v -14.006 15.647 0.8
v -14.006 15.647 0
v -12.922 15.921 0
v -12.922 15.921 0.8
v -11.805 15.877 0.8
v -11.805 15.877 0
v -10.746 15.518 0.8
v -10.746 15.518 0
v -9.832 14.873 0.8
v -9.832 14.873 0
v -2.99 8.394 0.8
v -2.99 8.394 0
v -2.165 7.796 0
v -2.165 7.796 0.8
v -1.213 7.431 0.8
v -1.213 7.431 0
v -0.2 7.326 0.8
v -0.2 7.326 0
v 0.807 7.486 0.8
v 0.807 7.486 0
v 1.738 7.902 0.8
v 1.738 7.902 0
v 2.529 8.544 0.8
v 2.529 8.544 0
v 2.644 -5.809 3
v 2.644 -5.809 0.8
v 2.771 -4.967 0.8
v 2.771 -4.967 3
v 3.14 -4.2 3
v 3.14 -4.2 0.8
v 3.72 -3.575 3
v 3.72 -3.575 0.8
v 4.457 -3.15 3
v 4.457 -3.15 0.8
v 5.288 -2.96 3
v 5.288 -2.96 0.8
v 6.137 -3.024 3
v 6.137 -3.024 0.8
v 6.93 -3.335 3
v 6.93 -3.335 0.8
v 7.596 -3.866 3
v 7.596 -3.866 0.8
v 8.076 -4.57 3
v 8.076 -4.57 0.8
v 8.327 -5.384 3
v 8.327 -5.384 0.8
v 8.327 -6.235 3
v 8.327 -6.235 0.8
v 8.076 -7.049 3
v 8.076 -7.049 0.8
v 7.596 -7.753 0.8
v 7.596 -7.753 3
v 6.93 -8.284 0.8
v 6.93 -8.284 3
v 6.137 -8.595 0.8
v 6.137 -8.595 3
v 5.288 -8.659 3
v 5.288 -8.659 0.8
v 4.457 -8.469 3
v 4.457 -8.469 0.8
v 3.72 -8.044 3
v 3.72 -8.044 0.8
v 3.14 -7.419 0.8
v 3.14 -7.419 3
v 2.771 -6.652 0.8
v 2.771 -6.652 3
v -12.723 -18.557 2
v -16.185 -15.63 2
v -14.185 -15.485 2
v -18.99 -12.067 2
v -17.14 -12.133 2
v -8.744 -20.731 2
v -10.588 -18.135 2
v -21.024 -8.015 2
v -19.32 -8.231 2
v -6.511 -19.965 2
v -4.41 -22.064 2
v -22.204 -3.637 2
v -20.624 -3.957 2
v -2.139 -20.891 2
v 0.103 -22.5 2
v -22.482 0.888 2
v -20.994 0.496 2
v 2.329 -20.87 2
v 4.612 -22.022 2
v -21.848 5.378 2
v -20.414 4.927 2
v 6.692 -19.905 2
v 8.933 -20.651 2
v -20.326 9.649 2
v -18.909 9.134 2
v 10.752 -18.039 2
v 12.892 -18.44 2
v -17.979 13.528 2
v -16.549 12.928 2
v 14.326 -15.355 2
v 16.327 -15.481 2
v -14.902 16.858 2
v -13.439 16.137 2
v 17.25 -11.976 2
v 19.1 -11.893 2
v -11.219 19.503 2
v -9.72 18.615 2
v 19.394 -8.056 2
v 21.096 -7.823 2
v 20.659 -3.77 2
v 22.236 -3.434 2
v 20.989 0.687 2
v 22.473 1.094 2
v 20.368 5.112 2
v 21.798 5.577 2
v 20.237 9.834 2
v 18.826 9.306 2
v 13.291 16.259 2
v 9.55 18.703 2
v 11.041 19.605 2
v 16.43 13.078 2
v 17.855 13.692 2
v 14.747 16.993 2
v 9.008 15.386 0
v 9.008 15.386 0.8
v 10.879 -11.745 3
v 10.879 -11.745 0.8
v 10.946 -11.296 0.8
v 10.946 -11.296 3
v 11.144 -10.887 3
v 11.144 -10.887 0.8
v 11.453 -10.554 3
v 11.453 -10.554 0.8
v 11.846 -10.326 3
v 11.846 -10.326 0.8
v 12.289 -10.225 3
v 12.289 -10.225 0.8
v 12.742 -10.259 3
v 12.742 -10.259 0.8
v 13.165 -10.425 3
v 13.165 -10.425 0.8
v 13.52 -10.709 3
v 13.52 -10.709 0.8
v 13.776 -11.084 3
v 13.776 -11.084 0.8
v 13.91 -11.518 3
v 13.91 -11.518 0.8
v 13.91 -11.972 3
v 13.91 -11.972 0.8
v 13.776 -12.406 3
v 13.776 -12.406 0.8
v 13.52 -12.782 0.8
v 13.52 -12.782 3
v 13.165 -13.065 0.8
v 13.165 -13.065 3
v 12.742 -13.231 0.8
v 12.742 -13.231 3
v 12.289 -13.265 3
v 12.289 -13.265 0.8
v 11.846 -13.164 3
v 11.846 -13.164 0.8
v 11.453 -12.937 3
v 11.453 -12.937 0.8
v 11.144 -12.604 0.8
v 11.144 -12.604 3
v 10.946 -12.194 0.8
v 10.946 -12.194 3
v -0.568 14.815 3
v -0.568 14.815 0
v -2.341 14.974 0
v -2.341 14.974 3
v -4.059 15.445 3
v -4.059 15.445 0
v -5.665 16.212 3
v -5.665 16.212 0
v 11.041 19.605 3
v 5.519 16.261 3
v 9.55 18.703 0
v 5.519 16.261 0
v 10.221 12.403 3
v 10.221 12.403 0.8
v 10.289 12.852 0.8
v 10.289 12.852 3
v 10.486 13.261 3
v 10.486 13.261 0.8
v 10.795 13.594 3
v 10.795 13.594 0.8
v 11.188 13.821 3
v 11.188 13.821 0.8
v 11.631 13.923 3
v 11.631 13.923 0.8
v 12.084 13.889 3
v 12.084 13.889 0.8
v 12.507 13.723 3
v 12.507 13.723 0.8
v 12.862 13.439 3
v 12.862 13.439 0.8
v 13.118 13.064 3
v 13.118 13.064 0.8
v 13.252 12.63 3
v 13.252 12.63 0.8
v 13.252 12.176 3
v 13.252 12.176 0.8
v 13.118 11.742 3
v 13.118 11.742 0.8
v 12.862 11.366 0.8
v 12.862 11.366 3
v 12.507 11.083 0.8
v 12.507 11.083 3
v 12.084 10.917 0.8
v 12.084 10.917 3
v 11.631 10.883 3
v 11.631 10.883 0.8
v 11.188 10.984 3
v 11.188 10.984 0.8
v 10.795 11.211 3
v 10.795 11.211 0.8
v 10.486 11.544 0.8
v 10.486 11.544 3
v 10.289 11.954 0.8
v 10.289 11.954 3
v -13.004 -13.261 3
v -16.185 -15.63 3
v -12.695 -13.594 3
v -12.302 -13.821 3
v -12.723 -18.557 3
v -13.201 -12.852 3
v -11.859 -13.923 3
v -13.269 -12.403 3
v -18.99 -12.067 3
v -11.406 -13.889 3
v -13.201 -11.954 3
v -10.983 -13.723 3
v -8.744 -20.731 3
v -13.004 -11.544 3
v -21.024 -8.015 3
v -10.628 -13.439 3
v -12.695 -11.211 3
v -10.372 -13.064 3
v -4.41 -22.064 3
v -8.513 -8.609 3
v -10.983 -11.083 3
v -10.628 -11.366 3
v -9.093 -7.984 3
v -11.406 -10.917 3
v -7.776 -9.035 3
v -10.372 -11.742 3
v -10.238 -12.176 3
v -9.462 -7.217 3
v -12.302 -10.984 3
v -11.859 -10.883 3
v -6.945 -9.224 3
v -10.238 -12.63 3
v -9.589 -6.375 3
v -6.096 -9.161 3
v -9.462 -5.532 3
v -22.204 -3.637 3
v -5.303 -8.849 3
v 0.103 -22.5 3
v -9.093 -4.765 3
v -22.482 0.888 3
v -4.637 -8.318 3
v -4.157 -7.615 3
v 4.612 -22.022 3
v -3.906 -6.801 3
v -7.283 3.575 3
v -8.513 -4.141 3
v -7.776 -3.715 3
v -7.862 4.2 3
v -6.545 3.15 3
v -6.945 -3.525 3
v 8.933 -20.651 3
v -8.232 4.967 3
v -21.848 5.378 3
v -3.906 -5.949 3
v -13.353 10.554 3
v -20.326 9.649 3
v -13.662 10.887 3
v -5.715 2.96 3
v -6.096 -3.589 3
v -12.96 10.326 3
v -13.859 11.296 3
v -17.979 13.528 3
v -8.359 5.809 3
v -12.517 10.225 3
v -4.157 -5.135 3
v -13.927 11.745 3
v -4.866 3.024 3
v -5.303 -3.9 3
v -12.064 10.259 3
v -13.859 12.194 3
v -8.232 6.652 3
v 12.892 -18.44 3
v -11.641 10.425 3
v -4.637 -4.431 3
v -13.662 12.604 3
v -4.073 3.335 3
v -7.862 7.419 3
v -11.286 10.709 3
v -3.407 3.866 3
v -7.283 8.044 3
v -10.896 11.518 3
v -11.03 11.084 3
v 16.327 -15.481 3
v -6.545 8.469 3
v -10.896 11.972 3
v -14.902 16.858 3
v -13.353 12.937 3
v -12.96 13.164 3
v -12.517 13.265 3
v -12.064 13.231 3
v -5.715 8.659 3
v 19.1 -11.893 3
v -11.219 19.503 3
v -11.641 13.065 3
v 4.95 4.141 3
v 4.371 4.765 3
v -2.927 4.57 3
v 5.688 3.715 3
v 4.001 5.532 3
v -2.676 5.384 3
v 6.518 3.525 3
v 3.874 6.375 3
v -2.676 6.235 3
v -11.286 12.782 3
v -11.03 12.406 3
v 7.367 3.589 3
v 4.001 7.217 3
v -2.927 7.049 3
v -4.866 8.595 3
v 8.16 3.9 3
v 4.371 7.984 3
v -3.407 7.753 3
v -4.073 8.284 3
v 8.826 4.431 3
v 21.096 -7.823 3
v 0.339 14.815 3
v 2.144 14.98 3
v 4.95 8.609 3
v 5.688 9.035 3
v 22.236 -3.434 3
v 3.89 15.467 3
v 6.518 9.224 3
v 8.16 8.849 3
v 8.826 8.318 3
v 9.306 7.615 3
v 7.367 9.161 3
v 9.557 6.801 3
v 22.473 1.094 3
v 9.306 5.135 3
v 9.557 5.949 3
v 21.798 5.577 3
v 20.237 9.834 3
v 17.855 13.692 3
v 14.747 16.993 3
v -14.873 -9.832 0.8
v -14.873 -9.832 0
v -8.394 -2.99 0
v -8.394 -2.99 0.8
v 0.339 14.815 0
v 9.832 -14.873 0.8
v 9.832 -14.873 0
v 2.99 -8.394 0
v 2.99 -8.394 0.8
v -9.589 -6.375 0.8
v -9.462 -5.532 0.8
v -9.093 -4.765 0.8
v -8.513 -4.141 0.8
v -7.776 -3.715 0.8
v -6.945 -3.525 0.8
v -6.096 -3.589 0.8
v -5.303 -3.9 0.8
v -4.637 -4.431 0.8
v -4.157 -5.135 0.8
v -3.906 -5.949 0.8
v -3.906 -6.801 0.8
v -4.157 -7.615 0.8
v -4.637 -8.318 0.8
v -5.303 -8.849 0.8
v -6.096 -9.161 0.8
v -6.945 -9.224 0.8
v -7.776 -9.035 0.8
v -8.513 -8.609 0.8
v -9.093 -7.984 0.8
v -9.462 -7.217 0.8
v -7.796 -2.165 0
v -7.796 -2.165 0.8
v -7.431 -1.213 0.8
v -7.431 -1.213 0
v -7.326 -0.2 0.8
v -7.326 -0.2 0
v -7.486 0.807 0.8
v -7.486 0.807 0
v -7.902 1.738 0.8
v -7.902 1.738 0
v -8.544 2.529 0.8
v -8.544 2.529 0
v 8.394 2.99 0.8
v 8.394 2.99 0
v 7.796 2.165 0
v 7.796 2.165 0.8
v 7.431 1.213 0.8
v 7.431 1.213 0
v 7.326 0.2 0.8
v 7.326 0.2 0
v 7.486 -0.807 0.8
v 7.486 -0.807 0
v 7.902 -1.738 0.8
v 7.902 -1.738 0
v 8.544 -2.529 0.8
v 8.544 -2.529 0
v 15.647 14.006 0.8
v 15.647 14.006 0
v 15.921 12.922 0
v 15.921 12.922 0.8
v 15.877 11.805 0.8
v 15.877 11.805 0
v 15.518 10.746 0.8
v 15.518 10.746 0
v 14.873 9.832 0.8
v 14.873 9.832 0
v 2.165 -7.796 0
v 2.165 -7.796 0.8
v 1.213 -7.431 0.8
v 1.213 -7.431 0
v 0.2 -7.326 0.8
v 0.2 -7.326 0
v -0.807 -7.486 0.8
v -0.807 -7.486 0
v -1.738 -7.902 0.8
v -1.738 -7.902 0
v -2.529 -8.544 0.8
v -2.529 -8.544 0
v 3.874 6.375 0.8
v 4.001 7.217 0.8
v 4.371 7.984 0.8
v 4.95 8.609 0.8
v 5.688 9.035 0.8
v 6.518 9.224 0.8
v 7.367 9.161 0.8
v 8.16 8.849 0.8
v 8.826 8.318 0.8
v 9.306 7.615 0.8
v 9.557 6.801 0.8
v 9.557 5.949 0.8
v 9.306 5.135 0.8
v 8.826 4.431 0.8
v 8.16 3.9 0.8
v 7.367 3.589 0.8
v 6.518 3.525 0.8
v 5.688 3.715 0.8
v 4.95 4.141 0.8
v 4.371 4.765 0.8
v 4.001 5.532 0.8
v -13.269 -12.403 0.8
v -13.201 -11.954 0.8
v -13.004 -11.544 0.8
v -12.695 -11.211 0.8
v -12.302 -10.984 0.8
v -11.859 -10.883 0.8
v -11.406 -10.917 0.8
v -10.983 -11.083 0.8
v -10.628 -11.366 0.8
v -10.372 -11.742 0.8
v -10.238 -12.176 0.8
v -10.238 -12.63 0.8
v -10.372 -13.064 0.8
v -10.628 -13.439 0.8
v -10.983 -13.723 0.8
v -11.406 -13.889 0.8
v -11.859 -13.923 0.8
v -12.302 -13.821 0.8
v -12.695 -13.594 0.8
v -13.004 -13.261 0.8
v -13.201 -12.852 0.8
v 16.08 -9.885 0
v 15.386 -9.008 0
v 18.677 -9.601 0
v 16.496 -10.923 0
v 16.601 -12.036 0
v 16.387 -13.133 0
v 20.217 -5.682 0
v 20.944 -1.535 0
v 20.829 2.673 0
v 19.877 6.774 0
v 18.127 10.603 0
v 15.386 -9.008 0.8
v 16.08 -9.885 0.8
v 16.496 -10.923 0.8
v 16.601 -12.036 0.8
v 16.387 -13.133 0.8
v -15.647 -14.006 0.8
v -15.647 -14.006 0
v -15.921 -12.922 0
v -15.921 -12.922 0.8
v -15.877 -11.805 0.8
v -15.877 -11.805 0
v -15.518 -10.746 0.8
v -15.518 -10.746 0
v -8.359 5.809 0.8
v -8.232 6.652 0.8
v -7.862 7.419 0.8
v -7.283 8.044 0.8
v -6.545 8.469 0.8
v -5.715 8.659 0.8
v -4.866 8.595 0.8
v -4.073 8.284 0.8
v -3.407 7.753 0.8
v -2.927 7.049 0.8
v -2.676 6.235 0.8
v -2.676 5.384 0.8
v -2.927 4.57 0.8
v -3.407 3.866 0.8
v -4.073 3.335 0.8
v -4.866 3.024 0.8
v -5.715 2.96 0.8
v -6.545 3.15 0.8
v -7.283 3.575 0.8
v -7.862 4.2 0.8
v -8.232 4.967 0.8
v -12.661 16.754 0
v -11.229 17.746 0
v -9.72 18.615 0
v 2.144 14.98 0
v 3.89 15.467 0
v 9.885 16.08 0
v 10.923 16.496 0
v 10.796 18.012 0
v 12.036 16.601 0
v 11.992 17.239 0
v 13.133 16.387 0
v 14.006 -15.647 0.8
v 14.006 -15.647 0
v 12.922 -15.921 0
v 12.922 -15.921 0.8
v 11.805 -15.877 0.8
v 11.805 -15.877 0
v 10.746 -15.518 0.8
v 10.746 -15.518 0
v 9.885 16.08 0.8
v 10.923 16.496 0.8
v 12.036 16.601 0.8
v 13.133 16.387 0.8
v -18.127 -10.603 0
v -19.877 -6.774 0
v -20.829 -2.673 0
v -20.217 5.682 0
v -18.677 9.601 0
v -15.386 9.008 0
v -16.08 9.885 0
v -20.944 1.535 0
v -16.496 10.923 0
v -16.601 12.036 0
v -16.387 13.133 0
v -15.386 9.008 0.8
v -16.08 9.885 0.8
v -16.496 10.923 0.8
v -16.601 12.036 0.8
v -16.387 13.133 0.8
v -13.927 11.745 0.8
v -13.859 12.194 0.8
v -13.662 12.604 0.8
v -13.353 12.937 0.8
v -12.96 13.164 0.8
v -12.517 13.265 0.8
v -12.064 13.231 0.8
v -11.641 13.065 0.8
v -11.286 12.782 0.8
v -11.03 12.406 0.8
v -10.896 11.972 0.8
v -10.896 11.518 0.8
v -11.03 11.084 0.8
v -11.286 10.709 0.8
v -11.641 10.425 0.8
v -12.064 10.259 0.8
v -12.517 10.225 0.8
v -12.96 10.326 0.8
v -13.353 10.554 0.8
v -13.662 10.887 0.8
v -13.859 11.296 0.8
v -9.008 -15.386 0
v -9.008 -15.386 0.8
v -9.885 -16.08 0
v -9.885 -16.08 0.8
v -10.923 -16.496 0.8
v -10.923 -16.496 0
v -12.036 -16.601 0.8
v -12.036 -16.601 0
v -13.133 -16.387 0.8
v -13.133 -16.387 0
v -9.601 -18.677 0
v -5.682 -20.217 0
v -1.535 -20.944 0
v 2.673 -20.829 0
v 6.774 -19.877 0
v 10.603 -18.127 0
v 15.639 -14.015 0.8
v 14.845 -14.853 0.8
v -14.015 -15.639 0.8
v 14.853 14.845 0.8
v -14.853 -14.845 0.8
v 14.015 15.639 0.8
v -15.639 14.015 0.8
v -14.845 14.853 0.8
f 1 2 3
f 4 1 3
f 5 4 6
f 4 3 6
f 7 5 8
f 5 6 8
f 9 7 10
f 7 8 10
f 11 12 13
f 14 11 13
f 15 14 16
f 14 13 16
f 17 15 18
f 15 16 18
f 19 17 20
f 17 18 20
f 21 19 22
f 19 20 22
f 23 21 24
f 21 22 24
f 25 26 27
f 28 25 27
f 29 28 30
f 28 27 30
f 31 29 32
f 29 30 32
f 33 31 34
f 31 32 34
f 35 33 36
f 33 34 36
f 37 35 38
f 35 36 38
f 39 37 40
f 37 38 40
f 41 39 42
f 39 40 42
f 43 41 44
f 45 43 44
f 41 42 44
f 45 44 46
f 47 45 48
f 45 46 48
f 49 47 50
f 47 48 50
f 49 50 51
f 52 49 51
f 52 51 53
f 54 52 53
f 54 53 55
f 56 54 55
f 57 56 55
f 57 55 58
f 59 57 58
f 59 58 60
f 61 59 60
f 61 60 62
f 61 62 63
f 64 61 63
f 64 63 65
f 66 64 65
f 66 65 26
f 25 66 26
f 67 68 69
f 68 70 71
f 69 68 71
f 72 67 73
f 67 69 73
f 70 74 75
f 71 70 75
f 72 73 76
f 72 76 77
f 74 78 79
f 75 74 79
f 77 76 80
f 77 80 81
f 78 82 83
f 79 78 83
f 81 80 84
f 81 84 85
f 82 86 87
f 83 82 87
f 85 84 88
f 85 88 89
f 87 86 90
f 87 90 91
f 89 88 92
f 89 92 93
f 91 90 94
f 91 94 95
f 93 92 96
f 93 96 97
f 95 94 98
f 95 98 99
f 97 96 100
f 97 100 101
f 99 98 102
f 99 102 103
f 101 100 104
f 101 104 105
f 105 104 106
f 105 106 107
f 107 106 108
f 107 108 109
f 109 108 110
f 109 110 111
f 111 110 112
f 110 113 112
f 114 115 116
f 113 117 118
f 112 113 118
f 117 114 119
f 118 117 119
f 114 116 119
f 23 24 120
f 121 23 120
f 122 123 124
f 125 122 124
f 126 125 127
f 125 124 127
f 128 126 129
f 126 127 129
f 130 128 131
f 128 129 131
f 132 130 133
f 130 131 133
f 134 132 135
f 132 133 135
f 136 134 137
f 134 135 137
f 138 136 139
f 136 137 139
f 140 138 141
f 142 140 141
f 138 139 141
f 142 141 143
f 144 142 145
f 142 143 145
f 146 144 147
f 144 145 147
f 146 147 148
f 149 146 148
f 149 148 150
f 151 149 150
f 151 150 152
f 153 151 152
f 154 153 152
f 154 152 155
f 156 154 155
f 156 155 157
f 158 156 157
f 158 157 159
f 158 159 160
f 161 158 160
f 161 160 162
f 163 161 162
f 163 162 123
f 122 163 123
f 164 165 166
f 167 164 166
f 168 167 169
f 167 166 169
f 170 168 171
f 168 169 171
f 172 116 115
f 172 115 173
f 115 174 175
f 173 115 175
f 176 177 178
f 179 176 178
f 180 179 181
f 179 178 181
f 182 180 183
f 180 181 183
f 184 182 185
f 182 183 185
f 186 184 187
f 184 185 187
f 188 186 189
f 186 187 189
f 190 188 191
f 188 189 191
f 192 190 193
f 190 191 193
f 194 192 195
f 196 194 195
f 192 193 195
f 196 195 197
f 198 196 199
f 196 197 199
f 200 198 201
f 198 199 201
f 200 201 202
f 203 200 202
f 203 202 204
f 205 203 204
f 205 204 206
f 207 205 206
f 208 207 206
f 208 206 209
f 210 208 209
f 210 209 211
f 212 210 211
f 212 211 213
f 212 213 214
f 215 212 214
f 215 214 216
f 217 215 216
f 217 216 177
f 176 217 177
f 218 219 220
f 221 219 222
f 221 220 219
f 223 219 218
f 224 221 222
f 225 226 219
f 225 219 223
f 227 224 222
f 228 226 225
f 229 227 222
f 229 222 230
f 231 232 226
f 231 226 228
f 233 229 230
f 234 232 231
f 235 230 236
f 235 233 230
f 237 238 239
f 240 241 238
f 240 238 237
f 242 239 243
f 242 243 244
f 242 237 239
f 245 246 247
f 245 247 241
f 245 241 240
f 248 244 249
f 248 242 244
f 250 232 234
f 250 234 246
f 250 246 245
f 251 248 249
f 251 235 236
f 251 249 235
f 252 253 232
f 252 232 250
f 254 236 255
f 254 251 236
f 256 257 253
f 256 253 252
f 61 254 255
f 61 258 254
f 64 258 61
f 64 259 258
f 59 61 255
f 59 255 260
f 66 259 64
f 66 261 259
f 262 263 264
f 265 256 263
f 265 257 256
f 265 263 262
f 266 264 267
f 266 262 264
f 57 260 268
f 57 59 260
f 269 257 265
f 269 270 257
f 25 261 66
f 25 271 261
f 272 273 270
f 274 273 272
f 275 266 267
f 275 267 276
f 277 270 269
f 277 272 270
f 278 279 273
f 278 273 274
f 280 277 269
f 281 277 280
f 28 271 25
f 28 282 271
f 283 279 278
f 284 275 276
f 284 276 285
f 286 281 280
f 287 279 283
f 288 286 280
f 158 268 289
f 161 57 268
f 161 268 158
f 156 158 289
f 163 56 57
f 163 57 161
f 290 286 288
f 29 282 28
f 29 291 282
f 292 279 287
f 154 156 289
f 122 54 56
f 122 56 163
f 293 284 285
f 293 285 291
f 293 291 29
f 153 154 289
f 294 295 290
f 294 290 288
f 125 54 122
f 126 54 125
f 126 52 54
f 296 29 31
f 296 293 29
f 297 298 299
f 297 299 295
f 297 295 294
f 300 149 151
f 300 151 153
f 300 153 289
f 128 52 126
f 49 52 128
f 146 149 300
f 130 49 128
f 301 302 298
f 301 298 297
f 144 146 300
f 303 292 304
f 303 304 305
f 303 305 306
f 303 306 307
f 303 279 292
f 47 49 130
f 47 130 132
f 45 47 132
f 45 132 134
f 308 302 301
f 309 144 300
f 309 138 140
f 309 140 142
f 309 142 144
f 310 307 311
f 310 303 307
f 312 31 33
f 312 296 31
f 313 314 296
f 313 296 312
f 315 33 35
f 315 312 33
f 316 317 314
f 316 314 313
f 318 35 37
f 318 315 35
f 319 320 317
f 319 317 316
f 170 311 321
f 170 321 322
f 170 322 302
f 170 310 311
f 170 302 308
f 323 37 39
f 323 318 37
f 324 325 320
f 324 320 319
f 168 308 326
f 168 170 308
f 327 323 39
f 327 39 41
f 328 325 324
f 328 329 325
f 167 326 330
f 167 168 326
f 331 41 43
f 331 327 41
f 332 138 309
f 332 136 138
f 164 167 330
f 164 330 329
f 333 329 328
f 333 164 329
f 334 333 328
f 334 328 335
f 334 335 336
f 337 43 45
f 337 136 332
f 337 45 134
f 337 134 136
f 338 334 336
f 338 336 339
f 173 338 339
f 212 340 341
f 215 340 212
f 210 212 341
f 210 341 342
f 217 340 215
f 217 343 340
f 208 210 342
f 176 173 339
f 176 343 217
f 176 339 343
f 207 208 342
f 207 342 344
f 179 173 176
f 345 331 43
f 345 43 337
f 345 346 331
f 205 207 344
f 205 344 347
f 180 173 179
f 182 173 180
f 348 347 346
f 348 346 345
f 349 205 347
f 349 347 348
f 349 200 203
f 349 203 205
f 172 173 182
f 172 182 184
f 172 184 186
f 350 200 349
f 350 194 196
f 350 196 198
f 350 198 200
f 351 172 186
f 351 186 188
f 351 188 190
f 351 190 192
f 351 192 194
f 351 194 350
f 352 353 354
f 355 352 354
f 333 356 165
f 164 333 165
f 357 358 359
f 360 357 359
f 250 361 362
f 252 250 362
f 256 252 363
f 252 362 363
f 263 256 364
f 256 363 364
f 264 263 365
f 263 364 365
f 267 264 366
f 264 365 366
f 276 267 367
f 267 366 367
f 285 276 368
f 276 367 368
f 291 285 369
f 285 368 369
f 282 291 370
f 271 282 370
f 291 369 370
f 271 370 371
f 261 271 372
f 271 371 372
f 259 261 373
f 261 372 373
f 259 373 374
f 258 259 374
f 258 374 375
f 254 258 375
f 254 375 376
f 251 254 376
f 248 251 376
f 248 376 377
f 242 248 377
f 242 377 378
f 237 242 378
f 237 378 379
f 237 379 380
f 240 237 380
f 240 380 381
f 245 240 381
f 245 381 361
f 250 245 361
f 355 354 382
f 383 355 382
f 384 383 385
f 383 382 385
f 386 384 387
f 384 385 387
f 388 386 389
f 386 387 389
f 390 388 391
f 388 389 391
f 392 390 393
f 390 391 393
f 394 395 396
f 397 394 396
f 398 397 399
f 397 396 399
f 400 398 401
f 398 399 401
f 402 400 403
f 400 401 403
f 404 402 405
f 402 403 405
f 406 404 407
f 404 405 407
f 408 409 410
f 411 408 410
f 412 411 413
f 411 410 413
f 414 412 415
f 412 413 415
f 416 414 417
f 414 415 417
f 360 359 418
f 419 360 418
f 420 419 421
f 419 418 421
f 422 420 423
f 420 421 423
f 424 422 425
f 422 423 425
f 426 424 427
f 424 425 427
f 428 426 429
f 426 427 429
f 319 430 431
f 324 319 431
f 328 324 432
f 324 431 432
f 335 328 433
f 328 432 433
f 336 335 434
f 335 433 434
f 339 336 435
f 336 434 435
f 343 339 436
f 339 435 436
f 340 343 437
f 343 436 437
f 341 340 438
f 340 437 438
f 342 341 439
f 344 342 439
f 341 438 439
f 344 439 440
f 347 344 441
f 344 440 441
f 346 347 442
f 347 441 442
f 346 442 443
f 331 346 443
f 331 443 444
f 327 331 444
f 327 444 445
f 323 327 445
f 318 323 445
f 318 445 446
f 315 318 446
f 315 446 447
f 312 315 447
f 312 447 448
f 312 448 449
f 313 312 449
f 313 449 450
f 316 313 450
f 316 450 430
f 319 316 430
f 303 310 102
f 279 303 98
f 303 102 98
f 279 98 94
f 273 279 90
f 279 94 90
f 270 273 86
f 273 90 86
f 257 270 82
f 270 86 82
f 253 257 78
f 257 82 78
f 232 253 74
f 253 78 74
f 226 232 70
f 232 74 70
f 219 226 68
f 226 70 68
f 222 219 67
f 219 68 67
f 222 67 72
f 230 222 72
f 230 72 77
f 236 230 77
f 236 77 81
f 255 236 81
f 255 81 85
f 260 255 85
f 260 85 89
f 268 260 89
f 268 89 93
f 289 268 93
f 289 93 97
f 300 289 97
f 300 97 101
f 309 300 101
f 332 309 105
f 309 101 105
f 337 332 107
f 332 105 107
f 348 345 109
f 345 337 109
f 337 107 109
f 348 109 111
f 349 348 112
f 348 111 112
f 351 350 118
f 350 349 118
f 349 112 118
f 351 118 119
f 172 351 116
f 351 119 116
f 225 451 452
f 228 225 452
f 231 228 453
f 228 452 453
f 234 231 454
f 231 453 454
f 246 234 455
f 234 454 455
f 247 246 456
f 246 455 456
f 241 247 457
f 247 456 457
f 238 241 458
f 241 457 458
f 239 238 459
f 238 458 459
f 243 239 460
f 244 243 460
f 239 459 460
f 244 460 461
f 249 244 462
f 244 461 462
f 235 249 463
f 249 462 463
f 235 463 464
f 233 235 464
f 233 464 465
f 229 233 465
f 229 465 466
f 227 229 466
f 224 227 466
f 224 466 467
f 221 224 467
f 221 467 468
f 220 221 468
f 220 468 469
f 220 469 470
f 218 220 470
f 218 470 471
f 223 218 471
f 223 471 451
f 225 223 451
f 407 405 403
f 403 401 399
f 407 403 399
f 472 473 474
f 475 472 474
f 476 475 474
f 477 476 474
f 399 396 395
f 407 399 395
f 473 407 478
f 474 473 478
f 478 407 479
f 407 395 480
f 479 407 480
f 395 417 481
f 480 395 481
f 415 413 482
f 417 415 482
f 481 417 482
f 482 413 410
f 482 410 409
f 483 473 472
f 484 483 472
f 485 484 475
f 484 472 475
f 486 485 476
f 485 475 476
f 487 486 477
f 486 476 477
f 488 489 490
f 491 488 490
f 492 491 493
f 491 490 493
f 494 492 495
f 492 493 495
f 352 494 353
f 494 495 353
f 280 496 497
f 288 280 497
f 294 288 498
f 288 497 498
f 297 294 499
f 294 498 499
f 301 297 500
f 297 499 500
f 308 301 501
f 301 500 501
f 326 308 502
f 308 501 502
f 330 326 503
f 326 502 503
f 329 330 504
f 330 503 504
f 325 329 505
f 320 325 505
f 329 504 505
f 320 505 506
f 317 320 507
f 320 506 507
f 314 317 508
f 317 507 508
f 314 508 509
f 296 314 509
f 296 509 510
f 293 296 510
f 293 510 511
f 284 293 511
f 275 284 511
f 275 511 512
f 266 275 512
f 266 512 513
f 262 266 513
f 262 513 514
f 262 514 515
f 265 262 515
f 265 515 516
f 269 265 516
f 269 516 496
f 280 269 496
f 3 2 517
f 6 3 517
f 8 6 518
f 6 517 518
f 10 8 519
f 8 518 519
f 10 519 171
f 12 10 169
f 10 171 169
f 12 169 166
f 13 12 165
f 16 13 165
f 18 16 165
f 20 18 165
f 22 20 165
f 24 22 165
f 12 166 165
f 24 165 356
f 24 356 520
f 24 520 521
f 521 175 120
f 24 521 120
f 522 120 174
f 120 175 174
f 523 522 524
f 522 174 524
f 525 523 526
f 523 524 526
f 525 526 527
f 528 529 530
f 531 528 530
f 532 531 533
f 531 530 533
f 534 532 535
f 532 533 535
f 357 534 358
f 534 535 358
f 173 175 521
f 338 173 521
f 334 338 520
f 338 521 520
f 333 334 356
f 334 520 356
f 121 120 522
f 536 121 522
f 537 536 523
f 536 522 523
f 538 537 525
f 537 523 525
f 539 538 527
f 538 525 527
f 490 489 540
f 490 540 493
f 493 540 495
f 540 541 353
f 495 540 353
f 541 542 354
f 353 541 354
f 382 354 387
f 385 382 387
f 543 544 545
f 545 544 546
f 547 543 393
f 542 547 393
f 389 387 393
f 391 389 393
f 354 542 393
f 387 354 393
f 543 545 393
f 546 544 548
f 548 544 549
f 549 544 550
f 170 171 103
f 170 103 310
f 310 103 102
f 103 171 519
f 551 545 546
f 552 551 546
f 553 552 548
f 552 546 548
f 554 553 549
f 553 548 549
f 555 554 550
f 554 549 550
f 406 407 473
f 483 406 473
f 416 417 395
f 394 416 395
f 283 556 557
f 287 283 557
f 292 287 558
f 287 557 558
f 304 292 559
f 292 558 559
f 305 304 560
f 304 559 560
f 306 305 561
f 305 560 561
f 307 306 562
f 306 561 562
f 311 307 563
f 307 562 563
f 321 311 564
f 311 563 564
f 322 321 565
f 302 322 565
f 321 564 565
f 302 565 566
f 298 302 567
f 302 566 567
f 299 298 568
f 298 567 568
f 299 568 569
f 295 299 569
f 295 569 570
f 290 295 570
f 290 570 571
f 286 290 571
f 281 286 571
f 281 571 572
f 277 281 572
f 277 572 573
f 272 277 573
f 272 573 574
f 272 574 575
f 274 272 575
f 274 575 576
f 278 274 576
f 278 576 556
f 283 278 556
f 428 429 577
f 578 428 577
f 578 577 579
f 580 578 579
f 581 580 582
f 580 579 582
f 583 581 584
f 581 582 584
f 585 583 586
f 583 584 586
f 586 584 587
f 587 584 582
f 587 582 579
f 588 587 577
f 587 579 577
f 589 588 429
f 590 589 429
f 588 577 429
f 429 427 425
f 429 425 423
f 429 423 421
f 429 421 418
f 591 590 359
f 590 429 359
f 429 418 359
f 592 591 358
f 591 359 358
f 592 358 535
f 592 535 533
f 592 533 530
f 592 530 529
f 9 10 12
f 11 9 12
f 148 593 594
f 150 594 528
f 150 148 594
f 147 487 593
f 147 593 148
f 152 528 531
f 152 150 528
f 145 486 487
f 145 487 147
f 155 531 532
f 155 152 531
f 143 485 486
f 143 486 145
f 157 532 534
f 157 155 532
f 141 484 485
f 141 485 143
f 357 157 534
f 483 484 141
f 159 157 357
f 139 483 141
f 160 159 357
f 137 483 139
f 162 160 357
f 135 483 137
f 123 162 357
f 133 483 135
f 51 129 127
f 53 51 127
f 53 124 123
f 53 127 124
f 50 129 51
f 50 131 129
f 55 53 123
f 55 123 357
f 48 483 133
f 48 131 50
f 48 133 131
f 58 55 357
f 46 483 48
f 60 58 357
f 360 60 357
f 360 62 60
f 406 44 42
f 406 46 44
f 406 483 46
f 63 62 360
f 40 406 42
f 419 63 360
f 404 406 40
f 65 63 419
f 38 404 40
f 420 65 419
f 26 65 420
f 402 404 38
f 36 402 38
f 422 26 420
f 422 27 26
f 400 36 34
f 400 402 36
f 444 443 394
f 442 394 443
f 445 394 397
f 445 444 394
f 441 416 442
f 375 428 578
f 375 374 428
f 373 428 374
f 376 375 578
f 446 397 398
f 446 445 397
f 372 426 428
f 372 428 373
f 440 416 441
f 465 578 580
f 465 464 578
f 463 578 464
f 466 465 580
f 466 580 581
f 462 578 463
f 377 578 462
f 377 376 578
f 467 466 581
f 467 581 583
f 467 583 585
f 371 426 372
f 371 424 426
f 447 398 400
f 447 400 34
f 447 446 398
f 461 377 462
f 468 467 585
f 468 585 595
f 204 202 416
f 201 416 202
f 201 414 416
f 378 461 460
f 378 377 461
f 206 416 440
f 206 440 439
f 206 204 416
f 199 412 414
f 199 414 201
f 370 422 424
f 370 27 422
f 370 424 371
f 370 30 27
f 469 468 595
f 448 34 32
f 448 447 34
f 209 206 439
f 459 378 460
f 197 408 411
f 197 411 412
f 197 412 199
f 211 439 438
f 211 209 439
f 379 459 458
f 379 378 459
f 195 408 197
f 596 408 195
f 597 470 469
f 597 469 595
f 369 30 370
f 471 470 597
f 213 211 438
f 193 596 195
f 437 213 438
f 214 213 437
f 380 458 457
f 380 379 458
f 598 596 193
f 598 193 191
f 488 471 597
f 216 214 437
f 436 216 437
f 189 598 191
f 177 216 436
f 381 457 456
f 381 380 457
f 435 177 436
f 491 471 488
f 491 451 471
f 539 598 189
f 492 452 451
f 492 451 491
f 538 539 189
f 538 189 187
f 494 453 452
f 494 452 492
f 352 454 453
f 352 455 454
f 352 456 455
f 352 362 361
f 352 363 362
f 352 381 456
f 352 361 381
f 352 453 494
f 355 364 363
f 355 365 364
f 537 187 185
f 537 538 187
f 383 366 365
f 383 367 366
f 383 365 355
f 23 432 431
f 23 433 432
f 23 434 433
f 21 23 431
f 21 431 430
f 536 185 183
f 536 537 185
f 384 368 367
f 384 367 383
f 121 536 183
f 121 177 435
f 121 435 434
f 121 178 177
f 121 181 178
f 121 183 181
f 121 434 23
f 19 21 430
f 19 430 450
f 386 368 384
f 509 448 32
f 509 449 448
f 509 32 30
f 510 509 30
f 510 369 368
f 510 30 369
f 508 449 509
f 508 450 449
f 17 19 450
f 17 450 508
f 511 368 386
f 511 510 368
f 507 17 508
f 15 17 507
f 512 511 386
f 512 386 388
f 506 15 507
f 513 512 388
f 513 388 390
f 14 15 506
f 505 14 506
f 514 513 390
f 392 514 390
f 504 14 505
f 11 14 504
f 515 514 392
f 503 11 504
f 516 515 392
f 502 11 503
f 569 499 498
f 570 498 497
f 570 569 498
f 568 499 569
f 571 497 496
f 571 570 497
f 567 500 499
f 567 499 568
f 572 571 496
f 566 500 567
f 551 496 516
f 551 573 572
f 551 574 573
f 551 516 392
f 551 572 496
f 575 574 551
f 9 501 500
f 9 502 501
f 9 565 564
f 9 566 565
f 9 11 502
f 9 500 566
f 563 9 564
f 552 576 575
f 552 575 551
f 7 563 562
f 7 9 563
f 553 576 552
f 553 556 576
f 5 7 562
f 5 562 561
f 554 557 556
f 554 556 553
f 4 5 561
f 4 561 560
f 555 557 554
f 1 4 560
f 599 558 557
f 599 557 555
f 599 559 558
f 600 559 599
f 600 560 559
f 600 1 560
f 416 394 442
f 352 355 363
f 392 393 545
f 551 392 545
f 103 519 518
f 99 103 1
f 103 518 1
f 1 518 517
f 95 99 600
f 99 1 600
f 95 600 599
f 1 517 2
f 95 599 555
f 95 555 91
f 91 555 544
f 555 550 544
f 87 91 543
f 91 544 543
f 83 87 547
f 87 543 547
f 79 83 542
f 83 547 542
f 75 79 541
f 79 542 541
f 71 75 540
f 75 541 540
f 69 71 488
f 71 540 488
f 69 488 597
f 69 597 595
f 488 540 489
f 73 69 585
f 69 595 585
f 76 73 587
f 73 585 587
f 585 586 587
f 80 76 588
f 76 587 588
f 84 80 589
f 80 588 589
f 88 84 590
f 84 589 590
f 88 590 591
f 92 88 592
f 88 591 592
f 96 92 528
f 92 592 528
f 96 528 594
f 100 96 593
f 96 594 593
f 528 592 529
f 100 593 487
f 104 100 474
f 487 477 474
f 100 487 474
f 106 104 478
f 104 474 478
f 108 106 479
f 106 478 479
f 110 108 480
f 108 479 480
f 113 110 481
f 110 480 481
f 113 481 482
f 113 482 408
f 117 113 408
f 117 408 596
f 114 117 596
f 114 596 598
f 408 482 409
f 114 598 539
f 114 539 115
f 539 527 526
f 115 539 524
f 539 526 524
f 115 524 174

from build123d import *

# Parameters (mm, degrees)
SKETCH1_R           = 21
BOSS_EXTRUDE1_DEPTH = 2
SKETCH2_R           = 22.5
BOSS_EXTRUDE2_DEPTH = 1
CUT_EXTRUDE1_DEPTH  = 0.8
CUT_EXTRUDE2_REACH  = 5
SKETCH4_R           = 1.524
SKETCH4_R_2         = 2.8575


with BuildPart() as part:
    # Sketch1 → Boss-Extrude1 (new body)
    with BuildSketch(Plane.XY):
        Circle(SKETCH1_R)
    extrude(amount=BOSS_EXTRUDE1_DEPTH)

    # Sketch2 → Boss-Extrude2 (add)
    with BuildSketch(Plane.XY.offset(2)):
        Circle(SKETCH2_R)
    extrude(amount=BOSS_EXTRUDE2_DEPTH)

    # Sketch3 → Cut-Extrude1 (cut)
    with BuildSketch(Plane(origin=(0, 0, 0), x_dir=(-1, 0, 0), z_dir=(0, 0, -1))):
        with BuildLine():
            Line((15.536569667, 14.527364659), (15.351441673, 14.722858401))
            ThreePointArc((15.351441673, 14.722858401), (12.623062926, 15.941035549), (9.832426491, 14.873161756))
            Line((9.832426491, 14.873161756), (2.990145498, 8.393681964))
            ThreePointArc((2.990145498, 8.393681964), (0.199509062, 7.325808172), (-2.528869685, 8.543985319))
            Line((-2.528869685, 8.543985319), (-9.008349476, 15.386266312))
            ThreePointArc((-9.008349476, 15.386266312), (-11.736728224, 16.604443459), (-14.527364659, 15.536569667))
            Line((-14.527364659, 15.536569667), (-14.722858401, 15.351441673))
            ThreePointArc((-14.722858401, 15.351441673), (-15.941035549, 12.623062926), (-14.873161756, 9.832426491))
            Line((-14.873161756, 9.832426491), (-8.393681964, 2.990145498))
            ThreePointArc((-8.393681964, 2.990145498), (-7.325808172, 0.199509062), (-8.543985319, -2.528869685))
            Line((-8.543985319, -2.528869685), (-15.386266312, -9.008349476))
            ThreePointArc((-15.386266312, -9.008349476), (-16.604443459, -11.736728224), (-15.536569667, -14.527364659))
            Line((-15.536569667, -14.527364659), (-15.351441673, -14.722858401))
            ThreePointArc((-15.351441673, -14.722858401), (-12.623062926, -15.941035549), (-9.832426491, -14.873161756))
            Line((-9.832426491, -14.873161756), (-2.990145498, -8.393681964))
            ThreePointArc((-2.990145498, -8.393681964), (-0.199509062, -7.325808172), (2.528869685, -8.543985319))
            Line((2.528869685, -8.543985319), (9.008349476, -15.386266312))
            ThreePointArc((9.008349476, -15.386266312), (11.736728224, -16.604443459), (14.527364659, -15.536569667))
            Line((14.527364659, -15.536569667), (14.722858401, -15.351441673))
            ThreePointArc((14.722858401, -15.351441673), (15.941035549, -12.623062926), (14.873161756, -9.832426491))
            Line((14.873161756, -9.832426491), (8.393681964, -2.990145498))
            ThreePointArc((8.393681964, -2.990145498), (7.325808172, -0.199509062), (8.543985319, 2.528869685))
            Line((8.543985319, 2.528869685), (15.386266312, 9.008349476))
            ThreePointArc((15.386266312, 9.008349476), (16.604443459, 11.736728224), (15.536569667, 14.527364659))
        make_face()
    extrude(amount=-CUT_EXTRUDE1_DEPTH, mode=Mode.SUBTRACT)

    # Sketch4 → Cut-Extrude2 (cut, up to next)
    with BuildSketch(Plane(origin=(0, 0, 0), x_dir=(-1, 0, 0), z_dir=(0, 0, -1)), mode=Mode.PRIVATE) as cut_extrude2_sk1:
        with Locations((12.402786975, 11.745148679)):
            Circle(SKETCH4_R)
    cut_extrude2_tool1 = extrude(cut_extrude2_sk1.sketch, amount=-CUT_EXTRUDE2_REACH, mode=Mode.PRIVATE) & part.part
    add(cut_extrude2_tool1.solids().sort_by_distance((-12.402787, 11.745149, 0))[0], mode=Mode.SUBTRACT)
    # Sketch4 → Cut-Extrude2 (cut, up to next)
    with BuildSketch(Plane(origin=(0, 0, 0), x_dir=(-1, 0, 0), z_dir=(0, 0, -1)), mode=Mode.PRIVATE) as cut_extrude2_sk2:
        with Locations((11.745148679, -12.402786975)):
            Circle(SKETCH4_R)
    cut_extrude2_tool2 = extrude(cut_extrude2_sk2.sketch, amount=-CUT_EXTRUDE2_REACH, mode=Mode.PRIVATE) & part.part
    add(cut_extrude2_tool2.solids().sort_by_distance((-11.745149, -12.402787, 0))[0], mode=Mode.SUBTRACT)
    # Sketch4 → Cut-Extrude2 (cut, up to next)
    with BuildSketch(Plane(origin=(0, 0, 0), x_dir=(-1, 0, 0), z_dir=(0, 0, -1)), mode=Mode.PRIVATE) as cut_extrude2_sk3:
        with Locations((-12.402786975, -11.745148679)):
            Circle(SKETCH4_R)
    cut_extrude2_tool3 = extrude(cut_extrude2_sk3.sketch, amount=-CUT_EXTRUDE2_REACH, mode=Mode.PRIVATE) & part.part
    add(cut_extrude2_tool3.solids().sort_by_distance((12.402787, -11.745149, 0))[0], mode=Mode.SUBTRACT)
    # Sketch4 → Cut-Extrude2 (cut, up to next)
    with BuildSketch(Plane(origin=(0, 0, 0), x_dir=(-1, 0, 0), z_dir=(0, 0, -1)), mode=Mode.PRIVATE) as cut_extrude2_sk4:
        with Locations((-11.745148679, 12.402786975)):
            Circle(SKETCH4_R)
    cut_extrude2_tool4 = extrude(cut_extrude2_sk4.sketch, amount=-CUT_EXTRUDE2_REACH, mode=Mode.PRIVATE) & part.part
    add(cut_extrude2_tool4.solids().sort_by_distance((11.745149, 12.402787, 0))[0], mode=Mode.SUBTRACT)
    # Sketch4 → Cut-Extrude2 (cut, up to next)
    with BuildSketch(Plane(origin=(0, 0, 0), x_dir=(-1, 0, 0), z_dir=(0, 0, -1)), mode=Mode.PRIVATE) as cut_extrude2_sk5:
        with Locations((6.731624158, -6.374690361)):
            Circle(SKETCH4_R_2)
    cut_extrude2_tool5 = extrude(cut_extrude2_sk5.sketch, amount=-CUT_EXTRUDE2_REACH, mode=Mode.PRIVATE) & part.part
    add(cut_extrude2_tool5.solids().sort_by_distance((-6.731624, -6.37469, 0))[0], mode=Mode.SUBTRACT)
    # Sketch4 → Cut-Extrude2 (cut, up to next)
    with BuildSketch(Plane(origin=(0, 0, 0), x_dir=(-1, 0, 0), z_dir=(0, 0, -1)), mode=Mode.PRIVATE) as cut_extrude2_sk6:
        with Locations((5.501445106, 5.809483862)):
            Circle(SKETCH4_R_2)
    cut_extrude2_tool6 = extrude(cut_extrude2_sk6.sketch, amount=-CUT_EXTRUDE2_REACH, mode=Mode.PRIVATE) & part.part
    add(cut_extrude2_tool6.solids().sort_by_distance((-5.501445, 5.809484, 0))[0], mode=Mode.SUBTRACT)
    # Sketch4 → Cut-Extrude2 (cut, up to next)
    with BuildSketch(Plane(origin=(0, 0, 0), x_dir=(-1, 0, 0), z_dir=(0, 0, -1)), mode=Mode.PRIVATE) as cut_extrude2_sk7:
        with Locations((-5.501445106, -5.809483862)):
            Circle(SKETCH4_R_2)
    cut_extrude2_tool7 = extrude(cut_extrude2_sk7.sketch, amount=-CUT_EXTRUDE2_REACH, mode=Mode.PRIVATE) & part.part
    add(cut_extrude2_tool7.solids().sort_by_distance((5.501445, -5.809484, 0))[0], mode=Mode.SUBTRACT)
    # Sketch4 → Cut-Extrude2 (cut, up to next)
    with BuildSketch(Plane(origin=(0, 0, 0), x_dir=(-1, 0, 0), z_dir=(0, 0, -1)), mode=Mode.PRIVATE) as cut_extrude2_sk8:
        with Locations((-6.731624158, 6.374690361)):
            Circle(SKETCH4_R_2)
    cut_extrude2_tool8 = extrude(cut_extrude2_sk8.sketch, amount=-CUT_EXTRUDE2_REACH, mode=Mode.PRIVATE) & part.part
    add(cut_extrude2_tool8.solids().sort_by_distance((6.731624, 6.37469, 0))[0], mode=Mode.SUBTRACT)
    # Sketch4 → Cut-Extrude2 (cut, up to next)
    with BuildSketch(Plane(origin=(0, 0, 0), x_dir=(-1, 0, 0), z_dir=(0, 0, -1)), mode=Mode.PRIVATE) as cut_extrude2_sk9:
        with BuildLine():
            Line((-11.040615308, 19.604969105), (-5.51854435, 16.261312284))
            ThreePointArc((-5.51854435, 16.261312284), (-3.027783619, 15.183648482), (-0.338986288, 14.815386067))
            Line((-0.338986288, 14.815386067), (0.567529778, 14.815386067))
            ThreePointArc((0.567529778, 14.815386067), (3.210473763, 15.170965551), (5.665462417, 16.212416649))
            Line((5.665462417, 16.212416649), (11.219097888, 19.503380286))
            ThreePointArc((11.219097888, 19.503380286), (0.10268437, 22.499765686), (-11.040615308, 19.604969105))
        make_face()
    cut_extrude2_tool9 = extrude(cut_extrude2_sk9.sketch, amount=-CUT_EXTRUDE2_REACH, mode=Mode.PRIVATE) & part.part
    add(cut_extrude2_tool9.solids().sort_by_distance((-0.08522, 18.896567, 0))[0], mode=Mode.SUBTRACT)


solid = part.part
